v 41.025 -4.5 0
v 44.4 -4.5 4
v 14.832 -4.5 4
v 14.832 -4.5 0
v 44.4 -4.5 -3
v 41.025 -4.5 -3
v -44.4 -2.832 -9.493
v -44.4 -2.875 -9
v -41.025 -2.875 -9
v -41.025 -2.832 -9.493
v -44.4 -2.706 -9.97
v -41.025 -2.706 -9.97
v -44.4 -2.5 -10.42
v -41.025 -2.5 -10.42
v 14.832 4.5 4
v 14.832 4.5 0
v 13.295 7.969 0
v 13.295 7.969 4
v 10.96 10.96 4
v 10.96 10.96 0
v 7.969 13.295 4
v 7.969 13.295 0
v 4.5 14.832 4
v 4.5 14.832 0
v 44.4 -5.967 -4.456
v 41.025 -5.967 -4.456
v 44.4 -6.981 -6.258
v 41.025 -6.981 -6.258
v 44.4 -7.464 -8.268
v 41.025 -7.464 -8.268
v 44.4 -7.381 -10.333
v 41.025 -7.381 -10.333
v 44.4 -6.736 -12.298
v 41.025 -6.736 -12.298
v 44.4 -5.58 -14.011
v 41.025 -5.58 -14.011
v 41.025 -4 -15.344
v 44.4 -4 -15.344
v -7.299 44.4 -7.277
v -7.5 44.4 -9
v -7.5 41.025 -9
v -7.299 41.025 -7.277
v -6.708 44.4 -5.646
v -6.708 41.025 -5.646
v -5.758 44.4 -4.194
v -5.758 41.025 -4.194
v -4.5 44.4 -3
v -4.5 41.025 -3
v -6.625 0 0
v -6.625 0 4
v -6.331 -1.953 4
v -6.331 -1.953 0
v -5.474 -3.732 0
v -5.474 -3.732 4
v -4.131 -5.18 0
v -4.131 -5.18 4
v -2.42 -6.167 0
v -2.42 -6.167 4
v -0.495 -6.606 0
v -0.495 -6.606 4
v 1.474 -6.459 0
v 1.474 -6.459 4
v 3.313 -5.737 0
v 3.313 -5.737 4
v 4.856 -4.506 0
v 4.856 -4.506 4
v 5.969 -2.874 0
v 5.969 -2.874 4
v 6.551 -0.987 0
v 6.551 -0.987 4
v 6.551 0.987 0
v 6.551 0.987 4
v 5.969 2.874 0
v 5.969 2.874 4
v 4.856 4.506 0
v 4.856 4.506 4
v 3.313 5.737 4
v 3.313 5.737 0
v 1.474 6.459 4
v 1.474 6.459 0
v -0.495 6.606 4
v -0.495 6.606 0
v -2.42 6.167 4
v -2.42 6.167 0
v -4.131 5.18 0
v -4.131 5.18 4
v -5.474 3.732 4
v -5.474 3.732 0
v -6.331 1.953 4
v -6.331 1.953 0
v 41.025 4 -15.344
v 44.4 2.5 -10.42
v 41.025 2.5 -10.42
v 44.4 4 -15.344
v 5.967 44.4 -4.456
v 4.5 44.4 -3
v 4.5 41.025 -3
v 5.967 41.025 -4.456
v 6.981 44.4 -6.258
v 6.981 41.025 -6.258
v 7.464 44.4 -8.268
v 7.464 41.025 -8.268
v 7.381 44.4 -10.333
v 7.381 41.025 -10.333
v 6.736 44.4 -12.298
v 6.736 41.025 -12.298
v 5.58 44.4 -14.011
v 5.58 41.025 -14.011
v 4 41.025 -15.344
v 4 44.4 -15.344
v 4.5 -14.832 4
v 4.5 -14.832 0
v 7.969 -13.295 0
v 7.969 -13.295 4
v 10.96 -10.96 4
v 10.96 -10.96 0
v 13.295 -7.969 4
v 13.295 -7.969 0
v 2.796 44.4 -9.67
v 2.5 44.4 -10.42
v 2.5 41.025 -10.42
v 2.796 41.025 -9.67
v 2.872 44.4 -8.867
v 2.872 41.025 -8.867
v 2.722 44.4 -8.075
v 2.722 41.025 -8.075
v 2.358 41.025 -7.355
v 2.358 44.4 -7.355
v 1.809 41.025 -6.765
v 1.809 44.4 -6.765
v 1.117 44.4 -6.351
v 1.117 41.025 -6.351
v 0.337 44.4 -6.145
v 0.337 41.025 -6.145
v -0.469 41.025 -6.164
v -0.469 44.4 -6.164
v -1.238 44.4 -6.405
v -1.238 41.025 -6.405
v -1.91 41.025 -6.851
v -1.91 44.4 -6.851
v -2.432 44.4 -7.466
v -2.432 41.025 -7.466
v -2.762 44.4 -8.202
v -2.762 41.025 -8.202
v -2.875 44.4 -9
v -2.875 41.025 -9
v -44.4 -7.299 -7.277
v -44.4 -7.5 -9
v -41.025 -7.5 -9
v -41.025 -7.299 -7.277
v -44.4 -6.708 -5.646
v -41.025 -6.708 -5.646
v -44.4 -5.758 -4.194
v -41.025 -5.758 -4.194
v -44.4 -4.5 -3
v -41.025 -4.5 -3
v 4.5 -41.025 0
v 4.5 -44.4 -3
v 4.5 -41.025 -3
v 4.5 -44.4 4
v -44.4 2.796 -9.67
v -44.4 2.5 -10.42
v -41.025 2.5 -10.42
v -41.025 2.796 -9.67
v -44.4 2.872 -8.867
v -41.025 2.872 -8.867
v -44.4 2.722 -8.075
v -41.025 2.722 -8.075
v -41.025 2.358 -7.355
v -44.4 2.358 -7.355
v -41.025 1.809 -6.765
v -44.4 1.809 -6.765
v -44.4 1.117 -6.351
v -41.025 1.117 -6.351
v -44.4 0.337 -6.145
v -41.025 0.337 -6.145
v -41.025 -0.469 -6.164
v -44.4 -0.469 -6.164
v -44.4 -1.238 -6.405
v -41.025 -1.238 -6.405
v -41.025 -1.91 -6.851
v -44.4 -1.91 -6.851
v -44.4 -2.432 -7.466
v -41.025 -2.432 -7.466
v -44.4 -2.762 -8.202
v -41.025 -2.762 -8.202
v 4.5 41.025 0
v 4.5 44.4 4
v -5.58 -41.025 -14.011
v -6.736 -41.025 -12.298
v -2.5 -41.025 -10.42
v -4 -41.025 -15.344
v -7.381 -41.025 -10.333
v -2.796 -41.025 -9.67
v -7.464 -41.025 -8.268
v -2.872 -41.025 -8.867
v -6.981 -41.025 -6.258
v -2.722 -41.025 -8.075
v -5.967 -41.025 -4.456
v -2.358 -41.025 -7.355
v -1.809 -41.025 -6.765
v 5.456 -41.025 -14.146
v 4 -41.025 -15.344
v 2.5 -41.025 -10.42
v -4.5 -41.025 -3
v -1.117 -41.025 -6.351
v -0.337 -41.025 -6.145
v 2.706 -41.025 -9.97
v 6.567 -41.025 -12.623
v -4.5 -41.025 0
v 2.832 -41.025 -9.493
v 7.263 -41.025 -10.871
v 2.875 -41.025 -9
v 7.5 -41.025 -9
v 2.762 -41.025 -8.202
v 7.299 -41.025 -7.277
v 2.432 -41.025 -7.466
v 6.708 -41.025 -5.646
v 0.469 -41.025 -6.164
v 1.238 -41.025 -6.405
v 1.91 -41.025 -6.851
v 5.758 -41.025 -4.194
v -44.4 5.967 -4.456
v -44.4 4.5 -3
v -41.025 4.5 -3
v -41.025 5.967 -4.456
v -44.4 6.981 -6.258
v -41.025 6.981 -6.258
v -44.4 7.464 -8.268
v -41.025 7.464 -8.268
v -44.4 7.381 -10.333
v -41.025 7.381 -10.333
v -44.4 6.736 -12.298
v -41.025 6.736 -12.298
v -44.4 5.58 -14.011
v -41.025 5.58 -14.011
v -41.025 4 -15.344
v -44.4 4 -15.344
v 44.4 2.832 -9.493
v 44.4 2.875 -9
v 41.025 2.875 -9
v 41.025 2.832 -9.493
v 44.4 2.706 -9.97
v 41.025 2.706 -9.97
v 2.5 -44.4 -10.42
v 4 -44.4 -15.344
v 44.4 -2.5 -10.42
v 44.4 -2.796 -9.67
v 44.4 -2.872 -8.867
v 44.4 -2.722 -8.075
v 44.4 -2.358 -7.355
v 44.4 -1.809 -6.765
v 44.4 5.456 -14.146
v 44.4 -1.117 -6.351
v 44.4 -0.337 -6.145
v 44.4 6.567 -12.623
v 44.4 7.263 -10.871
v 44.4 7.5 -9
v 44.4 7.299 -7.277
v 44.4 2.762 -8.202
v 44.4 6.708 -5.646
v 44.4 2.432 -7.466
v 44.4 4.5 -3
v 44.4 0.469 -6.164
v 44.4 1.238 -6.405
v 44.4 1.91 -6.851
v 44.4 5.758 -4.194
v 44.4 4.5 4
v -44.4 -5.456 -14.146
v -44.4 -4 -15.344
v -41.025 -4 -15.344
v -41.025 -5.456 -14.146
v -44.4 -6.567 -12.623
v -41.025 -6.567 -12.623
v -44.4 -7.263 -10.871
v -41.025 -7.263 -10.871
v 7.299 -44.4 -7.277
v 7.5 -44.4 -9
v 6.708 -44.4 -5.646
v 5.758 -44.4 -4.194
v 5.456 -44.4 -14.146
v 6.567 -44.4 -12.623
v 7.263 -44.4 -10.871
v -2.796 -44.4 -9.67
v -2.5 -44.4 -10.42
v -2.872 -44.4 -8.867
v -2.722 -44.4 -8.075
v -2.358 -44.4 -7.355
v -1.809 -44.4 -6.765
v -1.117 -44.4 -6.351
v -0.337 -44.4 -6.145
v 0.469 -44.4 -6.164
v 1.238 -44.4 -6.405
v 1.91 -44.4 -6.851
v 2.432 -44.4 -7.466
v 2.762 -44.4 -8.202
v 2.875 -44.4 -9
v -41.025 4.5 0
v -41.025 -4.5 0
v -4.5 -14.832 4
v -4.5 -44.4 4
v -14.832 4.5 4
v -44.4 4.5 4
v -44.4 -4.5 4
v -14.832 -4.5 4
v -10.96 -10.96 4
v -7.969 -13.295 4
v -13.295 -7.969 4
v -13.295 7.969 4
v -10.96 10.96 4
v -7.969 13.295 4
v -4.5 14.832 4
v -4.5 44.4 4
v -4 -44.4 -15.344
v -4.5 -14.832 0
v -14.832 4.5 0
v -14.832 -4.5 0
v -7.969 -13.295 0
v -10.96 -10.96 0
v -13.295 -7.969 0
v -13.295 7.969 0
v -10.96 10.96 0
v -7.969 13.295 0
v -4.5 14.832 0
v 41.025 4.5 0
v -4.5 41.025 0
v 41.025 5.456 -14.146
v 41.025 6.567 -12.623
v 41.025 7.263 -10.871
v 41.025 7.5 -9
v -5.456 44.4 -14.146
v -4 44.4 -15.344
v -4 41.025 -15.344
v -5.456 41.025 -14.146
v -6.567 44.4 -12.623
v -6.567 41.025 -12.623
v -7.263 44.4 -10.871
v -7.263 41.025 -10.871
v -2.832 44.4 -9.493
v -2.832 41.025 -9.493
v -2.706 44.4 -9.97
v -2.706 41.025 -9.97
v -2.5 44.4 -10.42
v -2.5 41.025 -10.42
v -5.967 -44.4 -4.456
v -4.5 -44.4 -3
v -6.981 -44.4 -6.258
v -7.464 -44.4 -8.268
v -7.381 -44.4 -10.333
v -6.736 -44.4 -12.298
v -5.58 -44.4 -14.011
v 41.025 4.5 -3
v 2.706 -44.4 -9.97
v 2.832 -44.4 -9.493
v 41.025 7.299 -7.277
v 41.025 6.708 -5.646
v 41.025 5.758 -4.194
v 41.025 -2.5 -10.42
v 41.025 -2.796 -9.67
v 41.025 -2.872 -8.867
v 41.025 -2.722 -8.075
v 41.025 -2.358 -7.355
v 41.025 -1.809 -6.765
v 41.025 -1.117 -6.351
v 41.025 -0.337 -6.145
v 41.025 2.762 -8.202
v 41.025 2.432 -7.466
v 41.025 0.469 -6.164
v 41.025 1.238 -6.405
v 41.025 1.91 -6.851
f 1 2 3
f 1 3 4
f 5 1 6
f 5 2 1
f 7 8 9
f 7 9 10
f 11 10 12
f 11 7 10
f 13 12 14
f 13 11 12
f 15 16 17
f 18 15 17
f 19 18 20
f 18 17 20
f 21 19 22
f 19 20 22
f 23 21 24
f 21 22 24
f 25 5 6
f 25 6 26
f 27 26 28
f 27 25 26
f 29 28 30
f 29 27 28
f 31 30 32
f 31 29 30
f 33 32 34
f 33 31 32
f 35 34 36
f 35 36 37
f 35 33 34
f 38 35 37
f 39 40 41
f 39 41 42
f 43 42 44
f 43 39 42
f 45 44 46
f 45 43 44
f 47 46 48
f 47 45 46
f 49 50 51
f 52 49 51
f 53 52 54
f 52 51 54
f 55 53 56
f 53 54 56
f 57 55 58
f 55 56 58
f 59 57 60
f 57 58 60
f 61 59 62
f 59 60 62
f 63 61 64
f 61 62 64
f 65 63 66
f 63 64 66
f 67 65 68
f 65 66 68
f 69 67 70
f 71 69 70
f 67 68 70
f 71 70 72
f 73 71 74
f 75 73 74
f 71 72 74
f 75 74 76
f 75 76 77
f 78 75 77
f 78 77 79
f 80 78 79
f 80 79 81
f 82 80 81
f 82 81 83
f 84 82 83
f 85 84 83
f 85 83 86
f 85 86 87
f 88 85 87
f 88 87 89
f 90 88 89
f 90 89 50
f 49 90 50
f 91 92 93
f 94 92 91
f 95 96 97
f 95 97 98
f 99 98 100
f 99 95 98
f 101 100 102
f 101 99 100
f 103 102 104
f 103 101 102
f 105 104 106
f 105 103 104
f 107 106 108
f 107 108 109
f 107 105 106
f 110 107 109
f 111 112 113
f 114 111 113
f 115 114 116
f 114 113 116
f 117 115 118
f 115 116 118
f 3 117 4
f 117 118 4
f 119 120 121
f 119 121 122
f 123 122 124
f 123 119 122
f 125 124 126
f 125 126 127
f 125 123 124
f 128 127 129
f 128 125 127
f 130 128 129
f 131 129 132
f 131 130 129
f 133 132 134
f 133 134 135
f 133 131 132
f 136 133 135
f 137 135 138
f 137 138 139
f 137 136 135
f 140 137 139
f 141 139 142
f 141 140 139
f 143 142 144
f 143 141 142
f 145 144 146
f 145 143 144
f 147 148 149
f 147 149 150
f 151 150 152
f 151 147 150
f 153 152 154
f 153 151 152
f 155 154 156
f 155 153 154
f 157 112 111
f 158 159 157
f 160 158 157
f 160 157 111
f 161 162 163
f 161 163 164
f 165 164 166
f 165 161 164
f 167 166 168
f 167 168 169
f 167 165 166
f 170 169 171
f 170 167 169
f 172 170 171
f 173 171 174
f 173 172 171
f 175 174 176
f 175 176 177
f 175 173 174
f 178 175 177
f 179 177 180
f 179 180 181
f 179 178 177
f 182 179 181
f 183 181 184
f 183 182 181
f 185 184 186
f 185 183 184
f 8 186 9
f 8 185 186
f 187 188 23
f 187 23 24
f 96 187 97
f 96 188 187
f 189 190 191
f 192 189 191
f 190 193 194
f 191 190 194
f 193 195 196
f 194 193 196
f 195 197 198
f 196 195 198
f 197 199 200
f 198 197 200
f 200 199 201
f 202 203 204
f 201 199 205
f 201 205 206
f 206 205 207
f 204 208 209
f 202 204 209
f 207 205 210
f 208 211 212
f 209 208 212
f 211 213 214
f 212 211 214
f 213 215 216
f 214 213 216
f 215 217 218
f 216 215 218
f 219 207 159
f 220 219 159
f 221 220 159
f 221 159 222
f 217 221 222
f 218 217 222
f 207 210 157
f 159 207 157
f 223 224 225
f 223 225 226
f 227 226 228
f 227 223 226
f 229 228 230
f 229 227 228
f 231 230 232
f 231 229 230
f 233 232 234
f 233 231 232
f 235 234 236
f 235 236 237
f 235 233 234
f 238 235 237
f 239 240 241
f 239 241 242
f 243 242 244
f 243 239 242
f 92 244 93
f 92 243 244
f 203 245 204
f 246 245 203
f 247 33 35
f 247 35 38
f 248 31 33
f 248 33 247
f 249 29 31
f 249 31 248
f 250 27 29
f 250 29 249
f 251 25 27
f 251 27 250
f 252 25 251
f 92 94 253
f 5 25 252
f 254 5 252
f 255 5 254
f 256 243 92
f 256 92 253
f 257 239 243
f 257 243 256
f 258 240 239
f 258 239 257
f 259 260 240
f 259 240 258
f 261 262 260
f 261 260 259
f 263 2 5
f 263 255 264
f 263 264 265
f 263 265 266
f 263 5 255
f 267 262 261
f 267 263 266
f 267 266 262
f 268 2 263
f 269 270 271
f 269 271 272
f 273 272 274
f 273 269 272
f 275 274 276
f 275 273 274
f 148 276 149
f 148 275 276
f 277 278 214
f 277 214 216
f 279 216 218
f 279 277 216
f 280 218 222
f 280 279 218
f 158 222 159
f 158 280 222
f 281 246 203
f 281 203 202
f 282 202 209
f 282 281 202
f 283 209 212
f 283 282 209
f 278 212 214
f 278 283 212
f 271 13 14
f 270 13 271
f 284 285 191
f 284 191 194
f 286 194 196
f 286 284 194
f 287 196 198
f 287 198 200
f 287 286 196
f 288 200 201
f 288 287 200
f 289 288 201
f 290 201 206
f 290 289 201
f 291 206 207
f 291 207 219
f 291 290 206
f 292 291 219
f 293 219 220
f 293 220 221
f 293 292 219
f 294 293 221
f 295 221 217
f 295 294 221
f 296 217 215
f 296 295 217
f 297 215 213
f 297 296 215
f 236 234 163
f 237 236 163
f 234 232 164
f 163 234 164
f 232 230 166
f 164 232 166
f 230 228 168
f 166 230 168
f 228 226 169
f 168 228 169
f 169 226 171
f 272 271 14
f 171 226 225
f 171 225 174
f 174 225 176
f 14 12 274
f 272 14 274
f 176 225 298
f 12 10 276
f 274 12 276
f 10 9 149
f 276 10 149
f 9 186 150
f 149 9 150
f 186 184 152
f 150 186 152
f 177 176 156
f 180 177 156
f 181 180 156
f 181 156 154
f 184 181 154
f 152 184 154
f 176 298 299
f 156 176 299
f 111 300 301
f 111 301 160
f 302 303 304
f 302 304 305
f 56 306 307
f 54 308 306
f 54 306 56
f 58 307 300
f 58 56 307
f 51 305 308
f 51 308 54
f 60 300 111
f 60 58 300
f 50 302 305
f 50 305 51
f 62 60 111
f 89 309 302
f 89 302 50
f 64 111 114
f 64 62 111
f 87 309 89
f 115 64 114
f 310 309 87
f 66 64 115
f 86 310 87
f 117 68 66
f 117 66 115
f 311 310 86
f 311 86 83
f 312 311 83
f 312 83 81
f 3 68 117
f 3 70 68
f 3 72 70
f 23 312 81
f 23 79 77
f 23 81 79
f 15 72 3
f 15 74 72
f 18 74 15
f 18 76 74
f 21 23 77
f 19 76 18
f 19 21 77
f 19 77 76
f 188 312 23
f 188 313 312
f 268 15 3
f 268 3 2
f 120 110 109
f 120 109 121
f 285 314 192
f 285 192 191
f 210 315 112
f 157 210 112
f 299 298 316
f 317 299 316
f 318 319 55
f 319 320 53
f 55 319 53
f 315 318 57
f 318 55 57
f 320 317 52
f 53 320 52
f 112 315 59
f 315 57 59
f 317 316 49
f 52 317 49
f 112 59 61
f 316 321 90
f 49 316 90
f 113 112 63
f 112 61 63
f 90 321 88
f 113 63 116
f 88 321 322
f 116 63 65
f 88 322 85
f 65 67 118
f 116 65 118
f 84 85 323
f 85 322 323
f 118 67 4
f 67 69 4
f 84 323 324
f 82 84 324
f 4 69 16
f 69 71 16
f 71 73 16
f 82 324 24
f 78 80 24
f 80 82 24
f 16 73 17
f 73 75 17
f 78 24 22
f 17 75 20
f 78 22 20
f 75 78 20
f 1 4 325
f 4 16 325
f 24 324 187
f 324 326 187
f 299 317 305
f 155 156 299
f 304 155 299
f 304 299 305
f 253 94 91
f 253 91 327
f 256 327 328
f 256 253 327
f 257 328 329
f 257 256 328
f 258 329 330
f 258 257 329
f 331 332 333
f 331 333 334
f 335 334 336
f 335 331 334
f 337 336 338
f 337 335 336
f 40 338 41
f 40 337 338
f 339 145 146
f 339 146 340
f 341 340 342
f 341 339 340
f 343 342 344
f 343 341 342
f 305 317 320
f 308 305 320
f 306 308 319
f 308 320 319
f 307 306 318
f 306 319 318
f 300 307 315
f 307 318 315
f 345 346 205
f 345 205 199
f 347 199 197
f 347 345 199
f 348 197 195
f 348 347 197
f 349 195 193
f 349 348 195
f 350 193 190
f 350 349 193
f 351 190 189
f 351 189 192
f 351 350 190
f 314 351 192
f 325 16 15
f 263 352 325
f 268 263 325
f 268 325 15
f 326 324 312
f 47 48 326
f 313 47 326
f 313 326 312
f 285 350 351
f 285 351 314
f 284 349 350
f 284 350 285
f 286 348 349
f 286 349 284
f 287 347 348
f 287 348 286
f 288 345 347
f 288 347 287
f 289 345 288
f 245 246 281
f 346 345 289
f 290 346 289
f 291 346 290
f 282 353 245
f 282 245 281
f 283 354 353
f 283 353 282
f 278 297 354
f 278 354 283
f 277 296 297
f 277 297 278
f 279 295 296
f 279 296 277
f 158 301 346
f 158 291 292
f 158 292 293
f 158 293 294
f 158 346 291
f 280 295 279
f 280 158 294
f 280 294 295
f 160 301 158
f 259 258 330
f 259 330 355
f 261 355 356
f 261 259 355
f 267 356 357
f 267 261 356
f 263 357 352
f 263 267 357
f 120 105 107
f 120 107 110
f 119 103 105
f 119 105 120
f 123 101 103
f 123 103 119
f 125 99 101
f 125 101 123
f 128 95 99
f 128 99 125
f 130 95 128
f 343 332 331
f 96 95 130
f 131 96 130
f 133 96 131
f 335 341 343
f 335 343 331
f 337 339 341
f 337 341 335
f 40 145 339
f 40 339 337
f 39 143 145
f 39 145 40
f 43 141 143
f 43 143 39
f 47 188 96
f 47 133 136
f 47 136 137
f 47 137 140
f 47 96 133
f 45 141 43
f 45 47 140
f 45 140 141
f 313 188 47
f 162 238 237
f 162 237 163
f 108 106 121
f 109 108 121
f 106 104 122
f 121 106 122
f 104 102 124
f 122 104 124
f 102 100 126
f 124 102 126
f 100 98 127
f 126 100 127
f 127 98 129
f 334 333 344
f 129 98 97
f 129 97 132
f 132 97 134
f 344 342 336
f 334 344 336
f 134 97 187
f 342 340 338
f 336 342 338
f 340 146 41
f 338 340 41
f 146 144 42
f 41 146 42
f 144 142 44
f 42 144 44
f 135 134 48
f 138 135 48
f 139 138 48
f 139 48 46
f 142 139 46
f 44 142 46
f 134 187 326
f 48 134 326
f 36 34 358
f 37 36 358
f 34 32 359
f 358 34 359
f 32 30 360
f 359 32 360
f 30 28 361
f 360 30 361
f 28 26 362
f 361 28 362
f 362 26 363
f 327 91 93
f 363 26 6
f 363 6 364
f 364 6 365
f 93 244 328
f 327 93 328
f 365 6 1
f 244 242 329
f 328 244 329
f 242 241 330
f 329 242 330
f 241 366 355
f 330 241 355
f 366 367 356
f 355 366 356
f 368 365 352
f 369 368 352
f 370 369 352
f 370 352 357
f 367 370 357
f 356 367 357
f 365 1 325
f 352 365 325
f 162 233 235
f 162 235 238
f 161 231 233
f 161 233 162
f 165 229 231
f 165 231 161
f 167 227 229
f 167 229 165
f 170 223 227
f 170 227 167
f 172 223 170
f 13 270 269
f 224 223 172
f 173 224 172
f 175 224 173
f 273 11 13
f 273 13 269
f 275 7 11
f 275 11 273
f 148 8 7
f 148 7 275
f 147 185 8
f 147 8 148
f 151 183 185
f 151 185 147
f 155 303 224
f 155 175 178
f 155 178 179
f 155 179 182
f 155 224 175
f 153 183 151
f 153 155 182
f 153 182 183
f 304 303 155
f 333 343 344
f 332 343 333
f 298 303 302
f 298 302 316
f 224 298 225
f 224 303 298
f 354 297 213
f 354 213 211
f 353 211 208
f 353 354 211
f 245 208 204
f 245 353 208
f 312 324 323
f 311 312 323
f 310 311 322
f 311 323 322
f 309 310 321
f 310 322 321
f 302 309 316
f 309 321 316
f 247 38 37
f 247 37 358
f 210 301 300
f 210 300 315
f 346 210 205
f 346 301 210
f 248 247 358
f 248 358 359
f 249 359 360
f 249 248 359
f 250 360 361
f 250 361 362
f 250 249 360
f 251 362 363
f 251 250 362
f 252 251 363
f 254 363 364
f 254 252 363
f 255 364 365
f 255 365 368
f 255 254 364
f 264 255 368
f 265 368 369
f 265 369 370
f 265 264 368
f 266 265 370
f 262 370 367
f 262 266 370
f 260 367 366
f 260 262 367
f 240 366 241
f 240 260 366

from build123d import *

# Parameters (mm, degrees)
F0_W      = 9
F0_H      = 9
F1_DEPTH  = 4
F7_DEPTH  = 3.375
F8_DEPTH  = 3.375
F9_DEPTH  = 3.375
F10_DEPTH = 3.375
F11_D     = 13.25


with BuildPart() as f1:
    # F0 (on Top) → F1 (new body)
    with BuildSketch(Plane.XY):
        with BuildLine():
            ThreePointArc((4.5, -14.8323969742), (0, -15.5), (-4.5, -14.8323969742))
            Line((-4.5, -14.8323969742), (-4.5, -44.4))
            Line((-4.5, -44.4), (4.5, -44.4))
            Line((4.5, -44.4), (4.5, -14.8323969742))
        make_face()
        with BuildLine():
            Line((4.5, -4.5), (-4.5, -4.5))
            Line((-4.5, -4.5), (-4.5, -14.8323969742))
            ThreePointArc((-4.5, -14.8323969742), (0, -15.5), (4.5, -14.8323969742))
            Line((4.5, -14.8323969742), (4.5, -4.5))
        make_face()
        with BuildLine():
            Line((-4.5, -4.5), (-14.8323969742, -4.5))
            ThreePointArc((-14.8323969742, -4.5), (-10.9601551084, -10.9601551084), (-4.5, -14.8323969742))
            Line((-4.5, -14.8323969742), (-4.5, -4.5))
        make_face()
        with BuildLine():
            Line((-4.5, 4.5), (-14.8323969742, 4.5))
            ThreePointArc((-14.8323969742, 4.5), (-15.5, 0), (-14.8323969742, -4.5))
            Line((-14.8323969742, -4.5), (-4.5, -4.5))
            Line((-4.5, -4.5), (-4.5, 4.5))
        make_face()
        with BuildLine():
            Line((14.8323969742, -4.5), (4.5, -4.5))
            Line((4.5, -4.5), (4.5, -14.8323969742))
            ThreePointArc((4.5, -14.8323969742), (10.9601551084, -10.9601551084), (14.8323969742, -4.5))
        make_face()
        with BuildLine():
            Line((14.8323969742, 4.5), (4.5, 4.5))
            Line((4.5, 4.5), (4.5, -4.5))
            Line((4.5, -4.5), (14.8323969742, -4.5))
            ThreePointArc((14.8323969742, -4.5), (15.3321908594, -2.2746260022), (15.5, 0))
            ThreePointArc((15.5, 0), (15.3321908594, 2.2746260022), (14.8323969742, 4.5))
        make_face()
        with BuildLine():
            Line((44.4, 4.5), (14.8323969742, 4.5))
            ThreePointArc((14.8323969742, 4.5), (15.3321908594, 2.2746260022), (15.5, 0))
            ThreePointArc((15.5, 0), (15.3321908594, -2.2746260022), (14.8323969742, -4.5))
            Line((14.8323969742, -4.5), (44.4, -4.5))
            Line((44.4, -4.5), (44.4, 4.5))
        make_face()
        with BuildLine():
            Line((-14.8323969742, 4.5), (-44.4, 4.5))
            Line((-44.4, 4.5), (-44.4, -4.5))
            Line((-44.4, -4.5), (-14.8323969742, -4.5))
            ThreePointArc((-14.8323969742, -4.5), (-15.5, 0), (-14.8323969742, 4.5))
        make_face()
        Rectangle(F0_W, F0_H)
        with BuildLine():
            Line((-4.5, 14.8323969742), (-4.5, 4.5))
            Line((-4.5, 4.5), (4.5, 4.5))
            Line((4.5, 4.5), (4.5, 14.8323969742))
            ThreePointArc((4.5, 14.8323969742), (0, 15.5), (-4.5, 14.8323969742))
        make_face()
        with BuildLine():
            Line((4.5, 14.8323969742), (4.5, 4.5))
            Line((4.5, 4.5), (14.8323969742, 4.5))
            ThreePointArc((14.8323969742, 4.5), (10.9601551084, 10.9601551084), (4.5, 14.8323969742))
        make_face()
        with BuildLine():
            Line((-4.5, 44.4), (-4.5, 14.8323969742))
            ThreePointArc((-4.5, 14.8323969742), (0, 15.5), (4.5, 14.8323969742))
            Line((4.5, 14.8323969742), (4.5, 44.4))
            Line((4.5, 44.4), (-4.5, 44.4))
        make_face()
        with BuildLine():
            ThreePointArc((-4.5, 14.8323969742), (-10.9601551084, 10.9601551084), (-14.8323969742, 4.5))
            Line((-14.8323969742, 4.5), (-4.5, 4.5))
            Line((-4.5, 4.5), (-4.5, 14.8323969742))
        make_face()
    extrude(amount=F1_DEPTH)

    # F3 (on face) → F7 (join)
    with BuildSketch(Plane.XZ.offset(44.4)):
        with BuildLine():
            Line((4.5, 0), (-4.5, 0))
            Line((-4.5, 0), (-4.5, -3))
            ThreePointArc((-4.5, -3), (0, -1.5), (4.5, -3))
            Line((4.5, -3), (4.5, 0))
        make_face()
        with BuildLine():
            Line((4.5, -3), (-4.5, -3))
            ThreePointArc((-4.5, -3), (-7.4938552368, -9.3035353181), (-4, -15.3442887702))
            Line((-4, -15.3442887702), (-2.5, -10.4197270865))
            ThreePointArc((-2.5, -10.4197270865), (-0.7342087578, -6.2203305053), (2.875, -9))
            ThreePointArc((2.875, -9), (2.7796694947, -9.7342087578), (2.5, -10.4197270865))
            Line((2.5, -10.4197270865), (4, -15.3442887702))
            ThreePointArc((4, -15.3442887702), (6.5669627683, -12.6228441865), (7.5, -9))
            ThreePointArc((7.5, -9), (6.7082039325, -5.6458980338), (4.5, -3))
        make_face()
        with BuildLine():
            ThreePointArc((4.5, -3), (0, -1.5), (-4.5, -3))
            Line((-4.5, -3), (4.5, -3))
        make_face()
    extrude(amount=-F7_DEPTH)

    # F6 (on face) → F8 (join)
    with BuildSketch(Plane.YZ.offset(44.4)):
        with BuildLine():
            Line((4.5, 0), (-4.5, 0))
            Line((-4.5, 0), (-4.5, -3))
            ThreePointArc((-4.5, -3), (0, -1.5), (4.5, -3))
            Line((4.5, -3), (4.5, 0))
        make_face()
        with BuildLine():
            ThreePointArc((4.5, -3), (0, -1.5), (-4.5, -3))
            Line((-4.5, -3), (4.5, -3))
        make_face()
        with BuildLine():
            Line((4.5, -3), (-4.5, -3))
            ThreePointArc((-4.5, -3), (-7.4938552368, -9.3035353181), (-4, -15.3442887702))
            Line((-4, -15.3442887702), (-2.5, -10.4197270865))
            ThreePointArc((-2.5, -10.4197270865), (-0.7342087578, -6.2203305053), (2.875, -9))
            ThreePointArc((2.875, -9), (2.7796694947, -9.7342087578), (2.5, -10.4197270865))
            Line((2.5, -10.4197270865), (4, -15.3442887702))
            ThreePointArc((4, -15.3442887702), (6.5669627683, -12.6228441865), (7.5, -9))
            ThreePointArc((7.5, -9), (6.7082039325, -5.6458980338), (4.5, -3))
        make_face()
    extrude(amount=-F8_DEPTH)

    # F5 (on face) → F9 (join)
    with BuildSketch(Plane(origin=(0, 44.4, 0), x_dir=(-1, 0, 0), z_dir=(0, 1, 0))):
        with BuildLine():
            Line((4.5, 0), (-4.5, 0))
            Line((-4.5, 0), (-4.5, -3))
            ThreePointArc((-4.5, -3), (0, -1.5), (4.5, -3))
            Line((4.5, -3), (4.5, 0))
        make_face()
        with BuildLine():
            ThreePointArc((4.5, -3), (0, -1.5), (-4.5, -3))
            Line((-4.5, -3), (4.5, -3))
        make_face()
        with BuildLine():
            Line((4.5, -3), (-4.5, -3))
            ThreePointArc((-4.5, -3), (-7.4938552368, -9.3035353181), (-4, -15.3442887702))
            Line((-4, -15.3442887702), (-2.5, -10.4197270865))
            ThreePointArc((-2.5, -10.4197270865), (-0.7342087578, -6.2203305053), (2.875, -9))
            ThreePointArc((2.875, -9), (2.7796694947, -9.7342087578), (2.5, -10.4197270865))
            Line((2.5, -10.4197270865), (4, -15.3442887702))
            ThreePointArc((4, -15.3442887702), (6.5669627683, -12.6228441865), (7.5, -9))
            ThreePointArc((7.5, -9), (6.7082039325, -5.6458980338), (4.5, -3))
        make_face()
    extrude(amount=-F9_DEPTH)

    # F4 (on face) → F10 (join)
    with BuildSketch(Plane(origin=(-44.4, 0, 0), x_dir=(0, -1, 0), z_dir=(-1, 0, 0))):
        with BuildLine():
            Line((4.5, 0), (-4.5, 0))
            Line((-4.5, 0), (-4.5, -3))
            ThreePointArc((-4.5, -3), (0, -1.5), (4.5, -3))
            Line((4.5, -3), (4.5, 0))
        make_face()
        with BuildLine():
            Line((4.5, -3), (-4.5, -3))
            ThreePointArc((-4.5, -3), (-7.4938552368, -9.3035353181), (-4, -15.3442887702))
            Line((-4, -15.3442887702), (-2.5, -10.4197270865))
            ThreePointArc((-2.5, -10.4197270865), (-0.7342087578, -6.2203305053), (2.875, -9))
            ThreePointArc((2.875, -9), (2.7796694947, -9.7342087578), (2.5, -10.4197270865))
            Line((2.5, -10.4197270865), (4, -15.3442887702))
            ThreePointArc((4, -15.3442887702), (6.5669627683, -12.6228441865), (7.5, -9))
            ThreePointArc((7.5, -9), (6.7082039325, -5.6458980338), (4.5, -3))
        make_face()
        with BuildLine():
            ThreePointArc((4.5, -3), (0, -1.5), (-4.5, -3))
            Line((-4.5, -3), (4.5, -3))
        make_face()
    extrude(amount=-F10_DEPTH)

    # F11 (through all)
    with Locations(Plane(origin=(0, 0, 0), x_dir=(1, 0, 0), z_dir=(0, 0, -1))):
        with Locations((0, 0)):
            Hole(F11_D / 2)


solid = f1.part
